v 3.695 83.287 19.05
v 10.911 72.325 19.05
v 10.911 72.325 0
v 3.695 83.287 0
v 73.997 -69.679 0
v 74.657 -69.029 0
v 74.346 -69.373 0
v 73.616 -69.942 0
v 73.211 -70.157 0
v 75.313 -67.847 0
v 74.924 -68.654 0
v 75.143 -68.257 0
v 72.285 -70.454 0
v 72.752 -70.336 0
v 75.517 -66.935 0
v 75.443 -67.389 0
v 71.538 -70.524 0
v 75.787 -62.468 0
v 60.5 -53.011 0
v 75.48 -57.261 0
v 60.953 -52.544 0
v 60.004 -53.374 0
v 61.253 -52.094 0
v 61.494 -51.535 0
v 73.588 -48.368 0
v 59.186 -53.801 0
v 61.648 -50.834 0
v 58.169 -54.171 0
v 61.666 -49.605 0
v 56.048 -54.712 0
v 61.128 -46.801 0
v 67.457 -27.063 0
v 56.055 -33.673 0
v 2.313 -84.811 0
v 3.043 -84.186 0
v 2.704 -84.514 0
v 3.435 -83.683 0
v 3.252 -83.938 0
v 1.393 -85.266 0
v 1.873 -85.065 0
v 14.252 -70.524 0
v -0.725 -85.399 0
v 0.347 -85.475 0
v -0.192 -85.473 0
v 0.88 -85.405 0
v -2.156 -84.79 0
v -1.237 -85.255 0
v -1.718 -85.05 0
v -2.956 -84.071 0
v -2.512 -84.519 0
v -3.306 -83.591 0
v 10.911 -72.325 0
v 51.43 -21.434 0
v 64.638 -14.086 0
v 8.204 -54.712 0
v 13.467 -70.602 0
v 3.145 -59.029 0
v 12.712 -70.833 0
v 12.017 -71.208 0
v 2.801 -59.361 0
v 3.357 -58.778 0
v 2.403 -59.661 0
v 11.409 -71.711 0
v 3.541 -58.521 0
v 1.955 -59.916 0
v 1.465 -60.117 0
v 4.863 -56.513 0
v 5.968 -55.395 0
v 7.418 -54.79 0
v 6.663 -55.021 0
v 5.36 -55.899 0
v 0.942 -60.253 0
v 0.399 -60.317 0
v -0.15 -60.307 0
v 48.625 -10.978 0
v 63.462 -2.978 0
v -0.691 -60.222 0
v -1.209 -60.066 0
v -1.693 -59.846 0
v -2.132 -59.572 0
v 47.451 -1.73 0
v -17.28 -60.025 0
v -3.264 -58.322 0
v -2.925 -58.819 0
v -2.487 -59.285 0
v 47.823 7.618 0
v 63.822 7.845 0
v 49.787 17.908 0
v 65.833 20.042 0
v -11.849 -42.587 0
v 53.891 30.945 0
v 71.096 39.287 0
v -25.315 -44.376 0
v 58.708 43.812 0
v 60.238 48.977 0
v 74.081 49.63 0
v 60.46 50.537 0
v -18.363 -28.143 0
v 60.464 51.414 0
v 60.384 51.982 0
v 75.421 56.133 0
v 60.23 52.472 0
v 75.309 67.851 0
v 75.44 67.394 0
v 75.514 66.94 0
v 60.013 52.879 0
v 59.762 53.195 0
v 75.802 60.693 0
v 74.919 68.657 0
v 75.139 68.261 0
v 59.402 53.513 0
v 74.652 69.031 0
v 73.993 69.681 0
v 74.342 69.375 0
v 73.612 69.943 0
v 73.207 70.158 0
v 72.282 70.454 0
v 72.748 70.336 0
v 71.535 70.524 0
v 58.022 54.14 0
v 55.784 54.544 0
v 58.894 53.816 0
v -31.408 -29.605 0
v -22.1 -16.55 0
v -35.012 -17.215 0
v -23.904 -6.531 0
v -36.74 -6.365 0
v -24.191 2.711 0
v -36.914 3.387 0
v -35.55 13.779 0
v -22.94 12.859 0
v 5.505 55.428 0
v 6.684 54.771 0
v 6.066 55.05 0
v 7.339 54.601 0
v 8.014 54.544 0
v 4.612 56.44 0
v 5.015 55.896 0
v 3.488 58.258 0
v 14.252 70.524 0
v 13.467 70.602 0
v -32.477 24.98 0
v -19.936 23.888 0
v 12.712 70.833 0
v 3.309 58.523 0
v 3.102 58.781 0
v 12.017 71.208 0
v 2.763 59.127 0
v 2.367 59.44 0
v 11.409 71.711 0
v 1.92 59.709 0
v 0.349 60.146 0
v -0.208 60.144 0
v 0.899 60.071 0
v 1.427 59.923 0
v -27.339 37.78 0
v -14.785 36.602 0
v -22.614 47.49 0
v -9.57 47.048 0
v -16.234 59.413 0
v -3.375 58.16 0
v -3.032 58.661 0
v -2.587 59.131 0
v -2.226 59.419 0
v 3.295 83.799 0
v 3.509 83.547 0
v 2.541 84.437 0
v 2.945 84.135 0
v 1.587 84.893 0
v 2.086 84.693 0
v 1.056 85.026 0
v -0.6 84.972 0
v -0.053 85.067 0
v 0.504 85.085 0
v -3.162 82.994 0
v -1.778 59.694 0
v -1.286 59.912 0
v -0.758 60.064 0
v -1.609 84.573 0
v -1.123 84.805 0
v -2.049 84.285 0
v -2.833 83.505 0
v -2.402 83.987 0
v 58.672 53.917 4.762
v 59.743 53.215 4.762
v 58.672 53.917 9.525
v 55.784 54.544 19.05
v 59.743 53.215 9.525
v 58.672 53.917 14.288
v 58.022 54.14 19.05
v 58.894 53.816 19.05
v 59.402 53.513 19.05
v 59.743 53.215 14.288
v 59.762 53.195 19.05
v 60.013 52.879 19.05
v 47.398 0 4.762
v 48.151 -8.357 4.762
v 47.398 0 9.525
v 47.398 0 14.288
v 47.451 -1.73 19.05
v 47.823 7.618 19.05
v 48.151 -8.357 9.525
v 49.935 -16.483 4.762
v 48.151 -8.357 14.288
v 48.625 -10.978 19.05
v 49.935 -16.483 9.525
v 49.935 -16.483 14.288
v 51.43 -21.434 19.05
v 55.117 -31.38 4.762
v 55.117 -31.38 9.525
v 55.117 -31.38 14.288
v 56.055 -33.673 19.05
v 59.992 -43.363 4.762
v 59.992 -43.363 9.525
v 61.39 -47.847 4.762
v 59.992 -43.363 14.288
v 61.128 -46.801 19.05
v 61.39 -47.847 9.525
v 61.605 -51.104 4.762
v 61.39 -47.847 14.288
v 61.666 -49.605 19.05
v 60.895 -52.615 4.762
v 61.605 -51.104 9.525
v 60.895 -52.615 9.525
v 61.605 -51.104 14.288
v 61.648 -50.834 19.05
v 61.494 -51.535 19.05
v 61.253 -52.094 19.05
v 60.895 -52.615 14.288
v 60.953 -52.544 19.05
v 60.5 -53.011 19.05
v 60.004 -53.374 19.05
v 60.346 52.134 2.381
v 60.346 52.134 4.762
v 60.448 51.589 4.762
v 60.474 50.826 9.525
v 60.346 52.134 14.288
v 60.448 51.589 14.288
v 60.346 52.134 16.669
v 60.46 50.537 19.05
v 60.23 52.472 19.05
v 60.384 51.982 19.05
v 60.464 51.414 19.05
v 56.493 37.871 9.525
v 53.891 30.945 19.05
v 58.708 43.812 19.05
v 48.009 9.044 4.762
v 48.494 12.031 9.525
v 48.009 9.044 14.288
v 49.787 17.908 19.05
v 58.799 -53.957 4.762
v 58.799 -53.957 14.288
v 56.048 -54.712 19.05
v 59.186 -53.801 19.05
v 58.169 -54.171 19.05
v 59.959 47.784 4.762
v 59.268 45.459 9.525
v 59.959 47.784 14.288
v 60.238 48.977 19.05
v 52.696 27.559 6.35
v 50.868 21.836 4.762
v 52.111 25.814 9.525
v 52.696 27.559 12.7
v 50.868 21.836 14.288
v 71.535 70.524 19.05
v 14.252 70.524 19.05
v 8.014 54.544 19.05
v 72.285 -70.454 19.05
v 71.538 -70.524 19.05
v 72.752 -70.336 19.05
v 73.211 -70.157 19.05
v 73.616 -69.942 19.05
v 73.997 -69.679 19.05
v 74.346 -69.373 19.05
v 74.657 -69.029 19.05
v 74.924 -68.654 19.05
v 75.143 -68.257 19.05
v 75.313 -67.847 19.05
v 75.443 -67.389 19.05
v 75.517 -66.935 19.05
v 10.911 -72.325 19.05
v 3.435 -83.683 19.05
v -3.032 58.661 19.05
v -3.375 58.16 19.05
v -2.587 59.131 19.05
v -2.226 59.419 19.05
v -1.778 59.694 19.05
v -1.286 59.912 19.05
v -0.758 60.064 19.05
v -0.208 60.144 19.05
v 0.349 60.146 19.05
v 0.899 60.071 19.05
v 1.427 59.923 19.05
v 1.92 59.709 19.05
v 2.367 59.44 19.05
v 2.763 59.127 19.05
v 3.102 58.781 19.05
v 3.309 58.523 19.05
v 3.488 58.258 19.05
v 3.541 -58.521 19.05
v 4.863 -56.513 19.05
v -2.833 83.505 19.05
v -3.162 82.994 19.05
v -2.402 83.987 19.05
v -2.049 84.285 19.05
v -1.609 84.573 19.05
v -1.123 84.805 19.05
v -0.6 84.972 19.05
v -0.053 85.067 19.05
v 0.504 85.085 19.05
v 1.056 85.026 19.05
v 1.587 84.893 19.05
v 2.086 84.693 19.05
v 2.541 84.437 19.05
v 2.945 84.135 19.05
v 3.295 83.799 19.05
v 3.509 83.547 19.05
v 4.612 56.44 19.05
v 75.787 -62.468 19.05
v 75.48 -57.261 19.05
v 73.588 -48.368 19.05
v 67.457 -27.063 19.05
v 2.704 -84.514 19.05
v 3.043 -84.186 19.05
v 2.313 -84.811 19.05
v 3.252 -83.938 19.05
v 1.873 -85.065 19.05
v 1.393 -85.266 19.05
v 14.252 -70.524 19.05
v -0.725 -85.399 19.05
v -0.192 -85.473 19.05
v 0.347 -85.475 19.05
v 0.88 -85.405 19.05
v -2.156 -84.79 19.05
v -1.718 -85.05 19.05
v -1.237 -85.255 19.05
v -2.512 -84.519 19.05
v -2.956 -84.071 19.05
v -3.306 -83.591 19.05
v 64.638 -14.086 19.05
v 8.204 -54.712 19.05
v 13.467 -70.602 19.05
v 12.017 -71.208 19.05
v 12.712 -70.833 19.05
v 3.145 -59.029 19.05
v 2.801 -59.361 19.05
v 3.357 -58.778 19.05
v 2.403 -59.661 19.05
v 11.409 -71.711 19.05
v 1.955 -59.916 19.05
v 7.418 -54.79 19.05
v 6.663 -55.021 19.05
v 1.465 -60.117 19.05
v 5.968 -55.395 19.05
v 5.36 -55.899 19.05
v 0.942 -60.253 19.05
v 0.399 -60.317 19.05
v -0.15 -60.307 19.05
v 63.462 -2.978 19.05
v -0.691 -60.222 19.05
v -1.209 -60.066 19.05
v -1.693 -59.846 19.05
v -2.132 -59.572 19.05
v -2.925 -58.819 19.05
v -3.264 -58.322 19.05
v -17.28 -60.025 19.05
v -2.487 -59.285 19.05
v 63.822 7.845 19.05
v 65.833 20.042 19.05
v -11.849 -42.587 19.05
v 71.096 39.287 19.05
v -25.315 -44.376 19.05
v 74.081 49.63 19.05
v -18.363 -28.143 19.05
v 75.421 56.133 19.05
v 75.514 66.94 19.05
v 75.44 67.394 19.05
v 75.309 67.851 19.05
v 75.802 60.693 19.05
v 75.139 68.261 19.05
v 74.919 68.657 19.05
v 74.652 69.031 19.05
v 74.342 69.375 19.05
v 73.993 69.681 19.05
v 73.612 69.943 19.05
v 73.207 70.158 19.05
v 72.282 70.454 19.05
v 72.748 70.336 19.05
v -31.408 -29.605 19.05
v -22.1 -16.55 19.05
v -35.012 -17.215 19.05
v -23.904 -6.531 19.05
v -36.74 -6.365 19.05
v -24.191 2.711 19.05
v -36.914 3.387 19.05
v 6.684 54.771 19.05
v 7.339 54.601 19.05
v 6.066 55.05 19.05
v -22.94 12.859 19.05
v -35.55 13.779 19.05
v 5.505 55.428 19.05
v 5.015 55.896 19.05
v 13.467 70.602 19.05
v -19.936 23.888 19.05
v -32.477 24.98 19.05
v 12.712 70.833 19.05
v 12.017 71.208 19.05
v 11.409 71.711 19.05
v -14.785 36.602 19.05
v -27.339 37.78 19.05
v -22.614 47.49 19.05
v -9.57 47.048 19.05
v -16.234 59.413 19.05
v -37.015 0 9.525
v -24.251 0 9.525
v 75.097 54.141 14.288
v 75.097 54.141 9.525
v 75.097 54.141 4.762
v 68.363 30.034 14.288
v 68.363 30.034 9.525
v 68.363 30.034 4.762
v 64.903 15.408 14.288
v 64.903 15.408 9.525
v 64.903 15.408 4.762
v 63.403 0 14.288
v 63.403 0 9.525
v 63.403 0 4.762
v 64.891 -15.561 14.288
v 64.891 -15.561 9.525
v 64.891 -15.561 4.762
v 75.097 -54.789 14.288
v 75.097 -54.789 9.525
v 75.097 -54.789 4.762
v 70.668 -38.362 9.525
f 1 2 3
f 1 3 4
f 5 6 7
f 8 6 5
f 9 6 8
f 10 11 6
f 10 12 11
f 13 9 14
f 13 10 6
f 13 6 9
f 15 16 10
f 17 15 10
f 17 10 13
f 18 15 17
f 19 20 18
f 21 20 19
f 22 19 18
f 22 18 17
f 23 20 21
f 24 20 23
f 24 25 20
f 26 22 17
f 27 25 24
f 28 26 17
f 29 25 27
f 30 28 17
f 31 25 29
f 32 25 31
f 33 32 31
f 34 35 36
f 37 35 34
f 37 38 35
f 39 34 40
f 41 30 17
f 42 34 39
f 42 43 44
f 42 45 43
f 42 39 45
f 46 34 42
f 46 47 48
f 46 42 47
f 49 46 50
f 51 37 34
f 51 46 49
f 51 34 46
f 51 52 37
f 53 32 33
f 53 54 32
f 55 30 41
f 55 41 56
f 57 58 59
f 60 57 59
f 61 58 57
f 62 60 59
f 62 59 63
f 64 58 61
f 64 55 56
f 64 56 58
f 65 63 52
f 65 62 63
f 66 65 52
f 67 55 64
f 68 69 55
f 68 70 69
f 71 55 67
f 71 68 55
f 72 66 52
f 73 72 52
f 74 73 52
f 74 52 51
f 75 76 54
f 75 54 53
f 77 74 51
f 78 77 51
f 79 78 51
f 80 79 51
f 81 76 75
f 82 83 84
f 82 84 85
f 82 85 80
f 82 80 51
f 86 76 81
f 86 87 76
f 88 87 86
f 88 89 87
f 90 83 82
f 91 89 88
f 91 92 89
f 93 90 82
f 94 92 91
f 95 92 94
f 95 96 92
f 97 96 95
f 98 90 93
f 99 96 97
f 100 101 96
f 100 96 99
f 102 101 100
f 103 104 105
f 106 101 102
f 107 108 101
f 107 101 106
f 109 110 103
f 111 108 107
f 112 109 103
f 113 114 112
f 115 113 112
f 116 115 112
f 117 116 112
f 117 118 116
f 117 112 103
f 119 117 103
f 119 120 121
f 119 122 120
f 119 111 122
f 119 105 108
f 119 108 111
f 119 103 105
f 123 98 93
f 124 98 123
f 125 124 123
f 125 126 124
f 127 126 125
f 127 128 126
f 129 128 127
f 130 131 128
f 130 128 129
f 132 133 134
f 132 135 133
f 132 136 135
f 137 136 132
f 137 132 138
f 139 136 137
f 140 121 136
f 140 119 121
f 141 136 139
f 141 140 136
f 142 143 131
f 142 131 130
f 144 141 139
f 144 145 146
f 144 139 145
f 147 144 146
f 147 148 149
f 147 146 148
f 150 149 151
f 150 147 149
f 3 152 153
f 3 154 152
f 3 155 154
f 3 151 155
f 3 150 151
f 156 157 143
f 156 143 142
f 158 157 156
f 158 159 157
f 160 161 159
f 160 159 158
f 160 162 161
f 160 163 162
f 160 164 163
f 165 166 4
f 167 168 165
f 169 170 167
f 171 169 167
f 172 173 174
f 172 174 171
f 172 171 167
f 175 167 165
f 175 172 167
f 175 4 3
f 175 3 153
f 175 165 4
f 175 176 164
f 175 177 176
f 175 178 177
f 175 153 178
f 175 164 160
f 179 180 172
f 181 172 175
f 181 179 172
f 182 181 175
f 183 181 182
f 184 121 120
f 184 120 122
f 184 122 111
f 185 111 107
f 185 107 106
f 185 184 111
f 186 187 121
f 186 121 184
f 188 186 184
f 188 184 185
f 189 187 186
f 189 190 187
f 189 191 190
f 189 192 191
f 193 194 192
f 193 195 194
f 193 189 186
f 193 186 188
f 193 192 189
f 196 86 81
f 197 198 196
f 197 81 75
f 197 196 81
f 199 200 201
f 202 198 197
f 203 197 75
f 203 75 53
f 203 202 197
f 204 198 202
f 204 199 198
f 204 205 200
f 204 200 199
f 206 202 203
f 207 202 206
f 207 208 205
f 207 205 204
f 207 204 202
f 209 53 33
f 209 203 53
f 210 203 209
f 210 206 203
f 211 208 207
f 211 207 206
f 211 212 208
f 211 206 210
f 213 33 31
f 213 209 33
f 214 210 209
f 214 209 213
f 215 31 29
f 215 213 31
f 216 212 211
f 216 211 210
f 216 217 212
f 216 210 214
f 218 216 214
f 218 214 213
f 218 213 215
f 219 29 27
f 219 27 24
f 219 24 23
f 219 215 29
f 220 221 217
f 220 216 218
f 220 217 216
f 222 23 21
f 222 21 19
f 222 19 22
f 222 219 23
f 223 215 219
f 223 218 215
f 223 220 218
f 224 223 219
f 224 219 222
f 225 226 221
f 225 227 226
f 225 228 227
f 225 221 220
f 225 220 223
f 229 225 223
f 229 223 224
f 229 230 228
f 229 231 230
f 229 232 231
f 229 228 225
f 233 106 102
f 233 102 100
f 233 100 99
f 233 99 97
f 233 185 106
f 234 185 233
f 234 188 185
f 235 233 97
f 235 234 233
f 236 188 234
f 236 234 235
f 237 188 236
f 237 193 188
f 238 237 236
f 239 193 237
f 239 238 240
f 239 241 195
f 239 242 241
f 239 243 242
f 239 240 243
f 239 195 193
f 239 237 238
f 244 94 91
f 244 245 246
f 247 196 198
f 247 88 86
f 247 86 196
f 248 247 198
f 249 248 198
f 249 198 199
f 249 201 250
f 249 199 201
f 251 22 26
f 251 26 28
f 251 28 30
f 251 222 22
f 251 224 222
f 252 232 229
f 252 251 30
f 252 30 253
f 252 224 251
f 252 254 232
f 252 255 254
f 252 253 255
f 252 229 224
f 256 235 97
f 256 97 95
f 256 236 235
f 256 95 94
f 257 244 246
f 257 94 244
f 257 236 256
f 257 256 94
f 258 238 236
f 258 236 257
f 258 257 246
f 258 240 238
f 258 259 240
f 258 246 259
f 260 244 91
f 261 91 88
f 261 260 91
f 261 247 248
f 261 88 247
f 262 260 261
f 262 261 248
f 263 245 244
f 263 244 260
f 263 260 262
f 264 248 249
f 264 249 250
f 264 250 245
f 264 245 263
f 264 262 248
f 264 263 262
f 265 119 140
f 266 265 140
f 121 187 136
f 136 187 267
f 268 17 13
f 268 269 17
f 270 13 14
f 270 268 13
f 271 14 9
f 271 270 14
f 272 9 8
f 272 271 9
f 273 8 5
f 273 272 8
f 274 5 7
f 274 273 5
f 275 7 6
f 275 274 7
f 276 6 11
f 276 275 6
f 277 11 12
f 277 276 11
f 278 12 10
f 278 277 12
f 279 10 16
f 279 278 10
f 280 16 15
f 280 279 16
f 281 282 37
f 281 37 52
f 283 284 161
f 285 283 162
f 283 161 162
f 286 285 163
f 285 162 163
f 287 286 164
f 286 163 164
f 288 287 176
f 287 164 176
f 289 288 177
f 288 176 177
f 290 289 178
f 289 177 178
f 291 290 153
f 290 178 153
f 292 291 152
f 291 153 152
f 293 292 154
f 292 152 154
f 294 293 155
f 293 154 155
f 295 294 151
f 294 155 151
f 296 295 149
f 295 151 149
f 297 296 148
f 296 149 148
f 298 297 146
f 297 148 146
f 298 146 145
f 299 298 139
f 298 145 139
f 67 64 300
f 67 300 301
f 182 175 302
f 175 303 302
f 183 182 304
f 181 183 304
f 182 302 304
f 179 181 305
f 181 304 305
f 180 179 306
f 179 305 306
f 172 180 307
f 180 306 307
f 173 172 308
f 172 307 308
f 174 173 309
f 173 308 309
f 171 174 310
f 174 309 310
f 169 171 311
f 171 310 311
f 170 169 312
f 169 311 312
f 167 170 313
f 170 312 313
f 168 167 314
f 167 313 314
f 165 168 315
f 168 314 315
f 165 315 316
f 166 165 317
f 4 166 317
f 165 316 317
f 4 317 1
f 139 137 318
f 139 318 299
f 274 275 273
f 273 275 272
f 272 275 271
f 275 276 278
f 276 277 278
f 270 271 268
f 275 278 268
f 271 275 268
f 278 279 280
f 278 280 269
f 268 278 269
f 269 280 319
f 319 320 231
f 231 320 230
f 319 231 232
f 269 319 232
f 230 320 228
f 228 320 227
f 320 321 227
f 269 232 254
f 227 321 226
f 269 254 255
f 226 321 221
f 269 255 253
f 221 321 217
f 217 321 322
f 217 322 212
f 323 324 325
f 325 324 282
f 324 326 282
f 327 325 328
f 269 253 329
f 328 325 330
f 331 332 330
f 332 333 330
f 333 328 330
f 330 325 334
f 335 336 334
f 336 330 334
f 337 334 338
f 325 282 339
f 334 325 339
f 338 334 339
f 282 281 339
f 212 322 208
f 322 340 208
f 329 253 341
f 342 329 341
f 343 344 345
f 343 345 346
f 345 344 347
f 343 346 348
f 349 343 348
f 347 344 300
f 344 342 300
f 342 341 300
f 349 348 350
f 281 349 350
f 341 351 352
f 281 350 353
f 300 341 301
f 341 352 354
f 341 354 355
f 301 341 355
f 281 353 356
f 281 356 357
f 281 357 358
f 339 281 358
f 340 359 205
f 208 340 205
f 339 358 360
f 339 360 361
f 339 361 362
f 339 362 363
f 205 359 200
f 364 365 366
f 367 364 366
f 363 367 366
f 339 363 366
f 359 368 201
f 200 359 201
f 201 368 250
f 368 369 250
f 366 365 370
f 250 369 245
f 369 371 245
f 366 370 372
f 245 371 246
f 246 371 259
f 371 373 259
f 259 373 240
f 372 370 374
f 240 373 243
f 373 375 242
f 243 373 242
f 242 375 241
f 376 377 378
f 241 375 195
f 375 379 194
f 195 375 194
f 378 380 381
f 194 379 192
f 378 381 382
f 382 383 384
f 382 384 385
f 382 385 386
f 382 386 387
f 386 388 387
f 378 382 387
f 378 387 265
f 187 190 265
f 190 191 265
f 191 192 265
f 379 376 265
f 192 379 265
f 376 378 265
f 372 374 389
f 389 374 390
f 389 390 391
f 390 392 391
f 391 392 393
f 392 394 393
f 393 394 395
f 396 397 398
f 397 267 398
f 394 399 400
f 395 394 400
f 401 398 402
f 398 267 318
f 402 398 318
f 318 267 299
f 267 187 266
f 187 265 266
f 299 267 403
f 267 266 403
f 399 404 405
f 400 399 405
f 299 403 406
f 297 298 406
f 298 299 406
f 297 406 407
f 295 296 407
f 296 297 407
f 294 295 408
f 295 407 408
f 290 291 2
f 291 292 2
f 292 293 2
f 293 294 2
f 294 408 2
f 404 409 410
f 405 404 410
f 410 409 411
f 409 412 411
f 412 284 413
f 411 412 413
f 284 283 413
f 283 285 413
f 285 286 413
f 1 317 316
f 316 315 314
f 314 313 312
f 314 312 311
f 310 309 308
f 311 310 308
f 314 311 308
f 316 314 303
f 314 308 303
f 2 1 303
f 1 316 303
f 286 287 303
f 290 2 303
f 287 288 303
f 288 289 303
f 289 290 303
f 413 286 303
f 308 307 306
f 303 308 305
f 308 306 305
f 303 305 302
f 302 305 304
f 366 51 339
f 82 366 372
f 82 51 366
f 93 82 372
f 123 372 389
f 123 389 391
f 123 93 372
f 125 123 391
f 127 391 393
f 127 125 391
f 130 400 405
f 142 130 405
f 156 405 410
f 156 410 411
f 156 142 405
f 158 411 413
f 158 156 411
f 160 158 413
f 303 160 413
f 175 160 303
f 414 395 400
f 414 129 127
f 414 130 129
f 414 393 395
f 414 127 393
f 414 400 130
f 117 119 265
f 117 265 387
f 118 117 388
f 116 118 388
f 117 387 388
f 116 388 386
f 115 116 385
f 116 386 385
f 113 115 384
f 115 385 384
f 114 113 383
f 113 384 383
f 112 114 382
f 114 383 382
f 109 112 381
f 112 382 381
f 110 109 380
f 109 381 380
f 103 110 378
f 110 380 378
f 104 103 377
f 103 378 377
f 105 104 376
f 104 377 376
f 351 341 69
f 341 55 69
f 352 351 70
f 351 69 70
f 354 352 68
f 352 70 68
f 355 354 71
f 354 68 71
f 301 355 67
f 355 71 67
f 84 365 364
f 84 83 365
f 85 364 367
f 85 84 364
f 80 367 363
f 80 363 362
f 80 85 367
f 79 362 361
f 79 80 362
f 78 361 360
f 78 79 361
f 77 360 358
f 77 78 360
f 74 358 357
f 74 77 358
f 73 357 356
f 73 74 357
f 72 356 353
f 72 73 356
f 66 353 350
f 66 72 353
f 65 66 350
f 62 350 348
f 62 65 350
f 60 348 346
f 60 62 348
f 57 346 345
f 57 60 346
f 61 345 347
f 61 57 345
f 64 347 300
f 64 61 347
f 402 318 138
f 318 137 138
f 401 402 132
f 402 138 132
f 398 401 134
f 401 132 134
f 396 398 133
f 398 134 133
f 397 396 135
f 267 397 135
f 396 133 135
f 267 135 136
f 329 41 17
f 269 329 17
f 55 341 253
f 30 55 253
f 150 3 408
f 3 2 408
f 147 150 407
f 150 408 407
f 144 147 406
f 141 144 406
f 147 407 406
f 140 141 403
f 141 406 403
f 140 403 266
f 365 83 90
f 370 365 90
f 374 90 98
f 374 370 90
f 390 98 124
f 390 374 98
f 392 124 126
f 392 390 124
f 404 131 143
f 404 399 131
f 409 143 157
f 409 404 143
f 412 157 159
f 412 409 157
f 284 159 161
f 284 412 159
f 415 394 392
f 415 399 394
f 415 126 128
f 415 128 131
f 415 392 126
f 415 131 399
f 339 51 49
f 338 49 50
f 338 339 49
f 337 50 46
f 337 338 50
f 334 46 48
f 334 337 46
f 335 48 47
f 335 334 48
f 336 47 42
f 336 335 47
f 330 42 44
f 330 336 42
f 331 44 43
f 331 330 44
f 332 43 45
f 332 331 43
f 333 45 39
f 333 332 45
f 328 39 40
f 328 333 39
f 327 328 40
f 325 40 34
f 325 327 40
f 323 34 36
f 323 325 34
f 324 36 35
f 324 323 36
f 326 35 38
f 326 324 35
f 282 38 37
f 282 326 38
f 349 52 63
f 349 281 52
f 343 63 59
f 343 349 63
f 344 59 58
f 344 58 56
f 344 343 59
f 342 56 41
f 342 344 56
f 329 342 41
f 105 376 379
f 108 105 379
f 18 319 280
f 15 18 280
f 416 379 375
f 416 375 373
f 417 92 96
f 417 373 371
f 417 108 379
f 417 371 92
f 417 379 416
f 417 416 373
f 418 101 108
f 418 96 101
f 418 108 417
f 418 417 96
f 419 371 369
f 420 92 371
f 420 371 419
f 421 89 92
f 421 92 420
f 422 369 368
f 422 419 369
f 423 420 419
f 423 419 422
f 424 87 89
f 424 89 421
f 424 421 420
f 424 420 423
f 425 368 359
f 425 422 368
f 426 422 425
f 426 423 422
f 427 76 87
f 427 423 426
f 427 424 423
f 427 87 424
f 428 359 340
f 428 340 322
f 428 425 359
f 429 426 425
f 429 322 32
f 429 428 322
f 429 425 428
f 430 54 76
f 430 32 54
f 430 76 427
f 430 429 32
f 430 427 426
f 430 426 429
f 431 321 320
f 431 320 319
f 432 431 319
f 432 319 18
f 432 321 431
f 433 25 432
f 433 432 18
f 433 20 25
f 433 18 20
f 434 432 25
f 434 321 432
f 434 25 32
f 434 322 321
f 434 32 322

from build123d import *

# Parameters (mm, degrees)
F1_DEPTH = 19.05
F3_DEPTH = 19.05
F4_R     = 4


with BuildPart() as f1:
    # F0 (on Top) → F1 (new body)
    with BuildSketch(Plane.XY):
        with BuildLine():
            add(Edge.make_bspline(
                [(0, -88.9), (-18.7615667395, -58.872751179), (-55.497587887, 2.319356984), (-18.3044684192, 54.234037211), (0, 88.9)],
                knots=[0, 0, 0, 0, 0.5, 1, 1, 1, 1], degree=3))
            Line((0, -88.9), (12.096735135, -70.5242279326))
            Line((12.096735135, -70.5242279326), (75.096735135, -70.5242279326))
            add(Edge.make_bspline(
                [(75.096735135, 70.5242279326), (75.6453777141, 65.842621729), (77.7669512859, 52.4624280909), (54.0778767649, 0.0958361046), (77.7020868907, -53.1321501243), (75.6250650534, -66.0721629988), (75.096735135, -70.5242279326)],
                knots=[0, 0, 0, 0, 0.1764310118, 0.500837432, 0.8270944973, 1, 1, 1, 1], degree=3))
            Line((75.096735135, 70.5242279326), (12.096735135, 70.5242279326))
            Line((12.096735135, 70.5242279326), (0, 88.9))
        make_face()
    extrude(amount=F1_DEPTH)

    # F2 (on face) → F3 (cut)
    with BuildSketch(Plane.XY.offset(19.05)):
        with BuildLine():
            add(Edge.make_bspline(
                [(0, -63.9), (-15.0066513258, -38.561437128), (-33.4891316908, -0.0640391576), (-15.0195212491, 38.6895154432), (0, 63.9)],
                knots=[0, 0, 0, 0, 0.5, 1, 1, 1, 1], degree=3))
            Line((0, -63.9), (6.0483675675, -54.7121139663))
            Line((6.0483675675, -54.7121139663), (56.0483675675, -54.7121139663))
            add(Edge.make_bspline(
                [(55.7842407716, 54.5435819516), (57.8413429651, 54.264139175), (66.4918207205, 53.0890329839), (32.3838227626, -0.5635362626), (68.3251031662, -51.8911242436), (58.5903282755, -54.1280136592), (56.0483675675, -54.7121139663)],
                knots=[0, 0, 0, 0, 0.1173857138, 0.4936276425, 0.8677752027, 1, 1, 1, 1], degree=3))
            Line((55.7842407716, 54.5435819516), (5.7842407716, 54.5435819516))
            Line((5.7842407716, 54.5435819516), (0, 63.9))
        make_face()
    extrude(amount=-F3_DEPTH, mode=Mode.SUBTRACT)

    # F4
    f4_edges = [f1.edges().sort_by_distance(p)[0] for p in [
        (0, -88.9, 9.525),
        (75.096735, -70.524228, 9.525),
        (5.784241, 54.543582, 9.525),
        (75.096735, 70.524228, 9.525),
        (0, 88.9, 9.525),
        (12.096735, 70.524228, 9.525),
        (12.096735, -70.524228, 9.525),
        (0, 63.9, 9.525),
        (0, -63.9, 9.525),
        (6.048368, -54.712114, 9.525),
    ]]
    fillet(f4_edges, radius=F4_R)


solid = f1.part
